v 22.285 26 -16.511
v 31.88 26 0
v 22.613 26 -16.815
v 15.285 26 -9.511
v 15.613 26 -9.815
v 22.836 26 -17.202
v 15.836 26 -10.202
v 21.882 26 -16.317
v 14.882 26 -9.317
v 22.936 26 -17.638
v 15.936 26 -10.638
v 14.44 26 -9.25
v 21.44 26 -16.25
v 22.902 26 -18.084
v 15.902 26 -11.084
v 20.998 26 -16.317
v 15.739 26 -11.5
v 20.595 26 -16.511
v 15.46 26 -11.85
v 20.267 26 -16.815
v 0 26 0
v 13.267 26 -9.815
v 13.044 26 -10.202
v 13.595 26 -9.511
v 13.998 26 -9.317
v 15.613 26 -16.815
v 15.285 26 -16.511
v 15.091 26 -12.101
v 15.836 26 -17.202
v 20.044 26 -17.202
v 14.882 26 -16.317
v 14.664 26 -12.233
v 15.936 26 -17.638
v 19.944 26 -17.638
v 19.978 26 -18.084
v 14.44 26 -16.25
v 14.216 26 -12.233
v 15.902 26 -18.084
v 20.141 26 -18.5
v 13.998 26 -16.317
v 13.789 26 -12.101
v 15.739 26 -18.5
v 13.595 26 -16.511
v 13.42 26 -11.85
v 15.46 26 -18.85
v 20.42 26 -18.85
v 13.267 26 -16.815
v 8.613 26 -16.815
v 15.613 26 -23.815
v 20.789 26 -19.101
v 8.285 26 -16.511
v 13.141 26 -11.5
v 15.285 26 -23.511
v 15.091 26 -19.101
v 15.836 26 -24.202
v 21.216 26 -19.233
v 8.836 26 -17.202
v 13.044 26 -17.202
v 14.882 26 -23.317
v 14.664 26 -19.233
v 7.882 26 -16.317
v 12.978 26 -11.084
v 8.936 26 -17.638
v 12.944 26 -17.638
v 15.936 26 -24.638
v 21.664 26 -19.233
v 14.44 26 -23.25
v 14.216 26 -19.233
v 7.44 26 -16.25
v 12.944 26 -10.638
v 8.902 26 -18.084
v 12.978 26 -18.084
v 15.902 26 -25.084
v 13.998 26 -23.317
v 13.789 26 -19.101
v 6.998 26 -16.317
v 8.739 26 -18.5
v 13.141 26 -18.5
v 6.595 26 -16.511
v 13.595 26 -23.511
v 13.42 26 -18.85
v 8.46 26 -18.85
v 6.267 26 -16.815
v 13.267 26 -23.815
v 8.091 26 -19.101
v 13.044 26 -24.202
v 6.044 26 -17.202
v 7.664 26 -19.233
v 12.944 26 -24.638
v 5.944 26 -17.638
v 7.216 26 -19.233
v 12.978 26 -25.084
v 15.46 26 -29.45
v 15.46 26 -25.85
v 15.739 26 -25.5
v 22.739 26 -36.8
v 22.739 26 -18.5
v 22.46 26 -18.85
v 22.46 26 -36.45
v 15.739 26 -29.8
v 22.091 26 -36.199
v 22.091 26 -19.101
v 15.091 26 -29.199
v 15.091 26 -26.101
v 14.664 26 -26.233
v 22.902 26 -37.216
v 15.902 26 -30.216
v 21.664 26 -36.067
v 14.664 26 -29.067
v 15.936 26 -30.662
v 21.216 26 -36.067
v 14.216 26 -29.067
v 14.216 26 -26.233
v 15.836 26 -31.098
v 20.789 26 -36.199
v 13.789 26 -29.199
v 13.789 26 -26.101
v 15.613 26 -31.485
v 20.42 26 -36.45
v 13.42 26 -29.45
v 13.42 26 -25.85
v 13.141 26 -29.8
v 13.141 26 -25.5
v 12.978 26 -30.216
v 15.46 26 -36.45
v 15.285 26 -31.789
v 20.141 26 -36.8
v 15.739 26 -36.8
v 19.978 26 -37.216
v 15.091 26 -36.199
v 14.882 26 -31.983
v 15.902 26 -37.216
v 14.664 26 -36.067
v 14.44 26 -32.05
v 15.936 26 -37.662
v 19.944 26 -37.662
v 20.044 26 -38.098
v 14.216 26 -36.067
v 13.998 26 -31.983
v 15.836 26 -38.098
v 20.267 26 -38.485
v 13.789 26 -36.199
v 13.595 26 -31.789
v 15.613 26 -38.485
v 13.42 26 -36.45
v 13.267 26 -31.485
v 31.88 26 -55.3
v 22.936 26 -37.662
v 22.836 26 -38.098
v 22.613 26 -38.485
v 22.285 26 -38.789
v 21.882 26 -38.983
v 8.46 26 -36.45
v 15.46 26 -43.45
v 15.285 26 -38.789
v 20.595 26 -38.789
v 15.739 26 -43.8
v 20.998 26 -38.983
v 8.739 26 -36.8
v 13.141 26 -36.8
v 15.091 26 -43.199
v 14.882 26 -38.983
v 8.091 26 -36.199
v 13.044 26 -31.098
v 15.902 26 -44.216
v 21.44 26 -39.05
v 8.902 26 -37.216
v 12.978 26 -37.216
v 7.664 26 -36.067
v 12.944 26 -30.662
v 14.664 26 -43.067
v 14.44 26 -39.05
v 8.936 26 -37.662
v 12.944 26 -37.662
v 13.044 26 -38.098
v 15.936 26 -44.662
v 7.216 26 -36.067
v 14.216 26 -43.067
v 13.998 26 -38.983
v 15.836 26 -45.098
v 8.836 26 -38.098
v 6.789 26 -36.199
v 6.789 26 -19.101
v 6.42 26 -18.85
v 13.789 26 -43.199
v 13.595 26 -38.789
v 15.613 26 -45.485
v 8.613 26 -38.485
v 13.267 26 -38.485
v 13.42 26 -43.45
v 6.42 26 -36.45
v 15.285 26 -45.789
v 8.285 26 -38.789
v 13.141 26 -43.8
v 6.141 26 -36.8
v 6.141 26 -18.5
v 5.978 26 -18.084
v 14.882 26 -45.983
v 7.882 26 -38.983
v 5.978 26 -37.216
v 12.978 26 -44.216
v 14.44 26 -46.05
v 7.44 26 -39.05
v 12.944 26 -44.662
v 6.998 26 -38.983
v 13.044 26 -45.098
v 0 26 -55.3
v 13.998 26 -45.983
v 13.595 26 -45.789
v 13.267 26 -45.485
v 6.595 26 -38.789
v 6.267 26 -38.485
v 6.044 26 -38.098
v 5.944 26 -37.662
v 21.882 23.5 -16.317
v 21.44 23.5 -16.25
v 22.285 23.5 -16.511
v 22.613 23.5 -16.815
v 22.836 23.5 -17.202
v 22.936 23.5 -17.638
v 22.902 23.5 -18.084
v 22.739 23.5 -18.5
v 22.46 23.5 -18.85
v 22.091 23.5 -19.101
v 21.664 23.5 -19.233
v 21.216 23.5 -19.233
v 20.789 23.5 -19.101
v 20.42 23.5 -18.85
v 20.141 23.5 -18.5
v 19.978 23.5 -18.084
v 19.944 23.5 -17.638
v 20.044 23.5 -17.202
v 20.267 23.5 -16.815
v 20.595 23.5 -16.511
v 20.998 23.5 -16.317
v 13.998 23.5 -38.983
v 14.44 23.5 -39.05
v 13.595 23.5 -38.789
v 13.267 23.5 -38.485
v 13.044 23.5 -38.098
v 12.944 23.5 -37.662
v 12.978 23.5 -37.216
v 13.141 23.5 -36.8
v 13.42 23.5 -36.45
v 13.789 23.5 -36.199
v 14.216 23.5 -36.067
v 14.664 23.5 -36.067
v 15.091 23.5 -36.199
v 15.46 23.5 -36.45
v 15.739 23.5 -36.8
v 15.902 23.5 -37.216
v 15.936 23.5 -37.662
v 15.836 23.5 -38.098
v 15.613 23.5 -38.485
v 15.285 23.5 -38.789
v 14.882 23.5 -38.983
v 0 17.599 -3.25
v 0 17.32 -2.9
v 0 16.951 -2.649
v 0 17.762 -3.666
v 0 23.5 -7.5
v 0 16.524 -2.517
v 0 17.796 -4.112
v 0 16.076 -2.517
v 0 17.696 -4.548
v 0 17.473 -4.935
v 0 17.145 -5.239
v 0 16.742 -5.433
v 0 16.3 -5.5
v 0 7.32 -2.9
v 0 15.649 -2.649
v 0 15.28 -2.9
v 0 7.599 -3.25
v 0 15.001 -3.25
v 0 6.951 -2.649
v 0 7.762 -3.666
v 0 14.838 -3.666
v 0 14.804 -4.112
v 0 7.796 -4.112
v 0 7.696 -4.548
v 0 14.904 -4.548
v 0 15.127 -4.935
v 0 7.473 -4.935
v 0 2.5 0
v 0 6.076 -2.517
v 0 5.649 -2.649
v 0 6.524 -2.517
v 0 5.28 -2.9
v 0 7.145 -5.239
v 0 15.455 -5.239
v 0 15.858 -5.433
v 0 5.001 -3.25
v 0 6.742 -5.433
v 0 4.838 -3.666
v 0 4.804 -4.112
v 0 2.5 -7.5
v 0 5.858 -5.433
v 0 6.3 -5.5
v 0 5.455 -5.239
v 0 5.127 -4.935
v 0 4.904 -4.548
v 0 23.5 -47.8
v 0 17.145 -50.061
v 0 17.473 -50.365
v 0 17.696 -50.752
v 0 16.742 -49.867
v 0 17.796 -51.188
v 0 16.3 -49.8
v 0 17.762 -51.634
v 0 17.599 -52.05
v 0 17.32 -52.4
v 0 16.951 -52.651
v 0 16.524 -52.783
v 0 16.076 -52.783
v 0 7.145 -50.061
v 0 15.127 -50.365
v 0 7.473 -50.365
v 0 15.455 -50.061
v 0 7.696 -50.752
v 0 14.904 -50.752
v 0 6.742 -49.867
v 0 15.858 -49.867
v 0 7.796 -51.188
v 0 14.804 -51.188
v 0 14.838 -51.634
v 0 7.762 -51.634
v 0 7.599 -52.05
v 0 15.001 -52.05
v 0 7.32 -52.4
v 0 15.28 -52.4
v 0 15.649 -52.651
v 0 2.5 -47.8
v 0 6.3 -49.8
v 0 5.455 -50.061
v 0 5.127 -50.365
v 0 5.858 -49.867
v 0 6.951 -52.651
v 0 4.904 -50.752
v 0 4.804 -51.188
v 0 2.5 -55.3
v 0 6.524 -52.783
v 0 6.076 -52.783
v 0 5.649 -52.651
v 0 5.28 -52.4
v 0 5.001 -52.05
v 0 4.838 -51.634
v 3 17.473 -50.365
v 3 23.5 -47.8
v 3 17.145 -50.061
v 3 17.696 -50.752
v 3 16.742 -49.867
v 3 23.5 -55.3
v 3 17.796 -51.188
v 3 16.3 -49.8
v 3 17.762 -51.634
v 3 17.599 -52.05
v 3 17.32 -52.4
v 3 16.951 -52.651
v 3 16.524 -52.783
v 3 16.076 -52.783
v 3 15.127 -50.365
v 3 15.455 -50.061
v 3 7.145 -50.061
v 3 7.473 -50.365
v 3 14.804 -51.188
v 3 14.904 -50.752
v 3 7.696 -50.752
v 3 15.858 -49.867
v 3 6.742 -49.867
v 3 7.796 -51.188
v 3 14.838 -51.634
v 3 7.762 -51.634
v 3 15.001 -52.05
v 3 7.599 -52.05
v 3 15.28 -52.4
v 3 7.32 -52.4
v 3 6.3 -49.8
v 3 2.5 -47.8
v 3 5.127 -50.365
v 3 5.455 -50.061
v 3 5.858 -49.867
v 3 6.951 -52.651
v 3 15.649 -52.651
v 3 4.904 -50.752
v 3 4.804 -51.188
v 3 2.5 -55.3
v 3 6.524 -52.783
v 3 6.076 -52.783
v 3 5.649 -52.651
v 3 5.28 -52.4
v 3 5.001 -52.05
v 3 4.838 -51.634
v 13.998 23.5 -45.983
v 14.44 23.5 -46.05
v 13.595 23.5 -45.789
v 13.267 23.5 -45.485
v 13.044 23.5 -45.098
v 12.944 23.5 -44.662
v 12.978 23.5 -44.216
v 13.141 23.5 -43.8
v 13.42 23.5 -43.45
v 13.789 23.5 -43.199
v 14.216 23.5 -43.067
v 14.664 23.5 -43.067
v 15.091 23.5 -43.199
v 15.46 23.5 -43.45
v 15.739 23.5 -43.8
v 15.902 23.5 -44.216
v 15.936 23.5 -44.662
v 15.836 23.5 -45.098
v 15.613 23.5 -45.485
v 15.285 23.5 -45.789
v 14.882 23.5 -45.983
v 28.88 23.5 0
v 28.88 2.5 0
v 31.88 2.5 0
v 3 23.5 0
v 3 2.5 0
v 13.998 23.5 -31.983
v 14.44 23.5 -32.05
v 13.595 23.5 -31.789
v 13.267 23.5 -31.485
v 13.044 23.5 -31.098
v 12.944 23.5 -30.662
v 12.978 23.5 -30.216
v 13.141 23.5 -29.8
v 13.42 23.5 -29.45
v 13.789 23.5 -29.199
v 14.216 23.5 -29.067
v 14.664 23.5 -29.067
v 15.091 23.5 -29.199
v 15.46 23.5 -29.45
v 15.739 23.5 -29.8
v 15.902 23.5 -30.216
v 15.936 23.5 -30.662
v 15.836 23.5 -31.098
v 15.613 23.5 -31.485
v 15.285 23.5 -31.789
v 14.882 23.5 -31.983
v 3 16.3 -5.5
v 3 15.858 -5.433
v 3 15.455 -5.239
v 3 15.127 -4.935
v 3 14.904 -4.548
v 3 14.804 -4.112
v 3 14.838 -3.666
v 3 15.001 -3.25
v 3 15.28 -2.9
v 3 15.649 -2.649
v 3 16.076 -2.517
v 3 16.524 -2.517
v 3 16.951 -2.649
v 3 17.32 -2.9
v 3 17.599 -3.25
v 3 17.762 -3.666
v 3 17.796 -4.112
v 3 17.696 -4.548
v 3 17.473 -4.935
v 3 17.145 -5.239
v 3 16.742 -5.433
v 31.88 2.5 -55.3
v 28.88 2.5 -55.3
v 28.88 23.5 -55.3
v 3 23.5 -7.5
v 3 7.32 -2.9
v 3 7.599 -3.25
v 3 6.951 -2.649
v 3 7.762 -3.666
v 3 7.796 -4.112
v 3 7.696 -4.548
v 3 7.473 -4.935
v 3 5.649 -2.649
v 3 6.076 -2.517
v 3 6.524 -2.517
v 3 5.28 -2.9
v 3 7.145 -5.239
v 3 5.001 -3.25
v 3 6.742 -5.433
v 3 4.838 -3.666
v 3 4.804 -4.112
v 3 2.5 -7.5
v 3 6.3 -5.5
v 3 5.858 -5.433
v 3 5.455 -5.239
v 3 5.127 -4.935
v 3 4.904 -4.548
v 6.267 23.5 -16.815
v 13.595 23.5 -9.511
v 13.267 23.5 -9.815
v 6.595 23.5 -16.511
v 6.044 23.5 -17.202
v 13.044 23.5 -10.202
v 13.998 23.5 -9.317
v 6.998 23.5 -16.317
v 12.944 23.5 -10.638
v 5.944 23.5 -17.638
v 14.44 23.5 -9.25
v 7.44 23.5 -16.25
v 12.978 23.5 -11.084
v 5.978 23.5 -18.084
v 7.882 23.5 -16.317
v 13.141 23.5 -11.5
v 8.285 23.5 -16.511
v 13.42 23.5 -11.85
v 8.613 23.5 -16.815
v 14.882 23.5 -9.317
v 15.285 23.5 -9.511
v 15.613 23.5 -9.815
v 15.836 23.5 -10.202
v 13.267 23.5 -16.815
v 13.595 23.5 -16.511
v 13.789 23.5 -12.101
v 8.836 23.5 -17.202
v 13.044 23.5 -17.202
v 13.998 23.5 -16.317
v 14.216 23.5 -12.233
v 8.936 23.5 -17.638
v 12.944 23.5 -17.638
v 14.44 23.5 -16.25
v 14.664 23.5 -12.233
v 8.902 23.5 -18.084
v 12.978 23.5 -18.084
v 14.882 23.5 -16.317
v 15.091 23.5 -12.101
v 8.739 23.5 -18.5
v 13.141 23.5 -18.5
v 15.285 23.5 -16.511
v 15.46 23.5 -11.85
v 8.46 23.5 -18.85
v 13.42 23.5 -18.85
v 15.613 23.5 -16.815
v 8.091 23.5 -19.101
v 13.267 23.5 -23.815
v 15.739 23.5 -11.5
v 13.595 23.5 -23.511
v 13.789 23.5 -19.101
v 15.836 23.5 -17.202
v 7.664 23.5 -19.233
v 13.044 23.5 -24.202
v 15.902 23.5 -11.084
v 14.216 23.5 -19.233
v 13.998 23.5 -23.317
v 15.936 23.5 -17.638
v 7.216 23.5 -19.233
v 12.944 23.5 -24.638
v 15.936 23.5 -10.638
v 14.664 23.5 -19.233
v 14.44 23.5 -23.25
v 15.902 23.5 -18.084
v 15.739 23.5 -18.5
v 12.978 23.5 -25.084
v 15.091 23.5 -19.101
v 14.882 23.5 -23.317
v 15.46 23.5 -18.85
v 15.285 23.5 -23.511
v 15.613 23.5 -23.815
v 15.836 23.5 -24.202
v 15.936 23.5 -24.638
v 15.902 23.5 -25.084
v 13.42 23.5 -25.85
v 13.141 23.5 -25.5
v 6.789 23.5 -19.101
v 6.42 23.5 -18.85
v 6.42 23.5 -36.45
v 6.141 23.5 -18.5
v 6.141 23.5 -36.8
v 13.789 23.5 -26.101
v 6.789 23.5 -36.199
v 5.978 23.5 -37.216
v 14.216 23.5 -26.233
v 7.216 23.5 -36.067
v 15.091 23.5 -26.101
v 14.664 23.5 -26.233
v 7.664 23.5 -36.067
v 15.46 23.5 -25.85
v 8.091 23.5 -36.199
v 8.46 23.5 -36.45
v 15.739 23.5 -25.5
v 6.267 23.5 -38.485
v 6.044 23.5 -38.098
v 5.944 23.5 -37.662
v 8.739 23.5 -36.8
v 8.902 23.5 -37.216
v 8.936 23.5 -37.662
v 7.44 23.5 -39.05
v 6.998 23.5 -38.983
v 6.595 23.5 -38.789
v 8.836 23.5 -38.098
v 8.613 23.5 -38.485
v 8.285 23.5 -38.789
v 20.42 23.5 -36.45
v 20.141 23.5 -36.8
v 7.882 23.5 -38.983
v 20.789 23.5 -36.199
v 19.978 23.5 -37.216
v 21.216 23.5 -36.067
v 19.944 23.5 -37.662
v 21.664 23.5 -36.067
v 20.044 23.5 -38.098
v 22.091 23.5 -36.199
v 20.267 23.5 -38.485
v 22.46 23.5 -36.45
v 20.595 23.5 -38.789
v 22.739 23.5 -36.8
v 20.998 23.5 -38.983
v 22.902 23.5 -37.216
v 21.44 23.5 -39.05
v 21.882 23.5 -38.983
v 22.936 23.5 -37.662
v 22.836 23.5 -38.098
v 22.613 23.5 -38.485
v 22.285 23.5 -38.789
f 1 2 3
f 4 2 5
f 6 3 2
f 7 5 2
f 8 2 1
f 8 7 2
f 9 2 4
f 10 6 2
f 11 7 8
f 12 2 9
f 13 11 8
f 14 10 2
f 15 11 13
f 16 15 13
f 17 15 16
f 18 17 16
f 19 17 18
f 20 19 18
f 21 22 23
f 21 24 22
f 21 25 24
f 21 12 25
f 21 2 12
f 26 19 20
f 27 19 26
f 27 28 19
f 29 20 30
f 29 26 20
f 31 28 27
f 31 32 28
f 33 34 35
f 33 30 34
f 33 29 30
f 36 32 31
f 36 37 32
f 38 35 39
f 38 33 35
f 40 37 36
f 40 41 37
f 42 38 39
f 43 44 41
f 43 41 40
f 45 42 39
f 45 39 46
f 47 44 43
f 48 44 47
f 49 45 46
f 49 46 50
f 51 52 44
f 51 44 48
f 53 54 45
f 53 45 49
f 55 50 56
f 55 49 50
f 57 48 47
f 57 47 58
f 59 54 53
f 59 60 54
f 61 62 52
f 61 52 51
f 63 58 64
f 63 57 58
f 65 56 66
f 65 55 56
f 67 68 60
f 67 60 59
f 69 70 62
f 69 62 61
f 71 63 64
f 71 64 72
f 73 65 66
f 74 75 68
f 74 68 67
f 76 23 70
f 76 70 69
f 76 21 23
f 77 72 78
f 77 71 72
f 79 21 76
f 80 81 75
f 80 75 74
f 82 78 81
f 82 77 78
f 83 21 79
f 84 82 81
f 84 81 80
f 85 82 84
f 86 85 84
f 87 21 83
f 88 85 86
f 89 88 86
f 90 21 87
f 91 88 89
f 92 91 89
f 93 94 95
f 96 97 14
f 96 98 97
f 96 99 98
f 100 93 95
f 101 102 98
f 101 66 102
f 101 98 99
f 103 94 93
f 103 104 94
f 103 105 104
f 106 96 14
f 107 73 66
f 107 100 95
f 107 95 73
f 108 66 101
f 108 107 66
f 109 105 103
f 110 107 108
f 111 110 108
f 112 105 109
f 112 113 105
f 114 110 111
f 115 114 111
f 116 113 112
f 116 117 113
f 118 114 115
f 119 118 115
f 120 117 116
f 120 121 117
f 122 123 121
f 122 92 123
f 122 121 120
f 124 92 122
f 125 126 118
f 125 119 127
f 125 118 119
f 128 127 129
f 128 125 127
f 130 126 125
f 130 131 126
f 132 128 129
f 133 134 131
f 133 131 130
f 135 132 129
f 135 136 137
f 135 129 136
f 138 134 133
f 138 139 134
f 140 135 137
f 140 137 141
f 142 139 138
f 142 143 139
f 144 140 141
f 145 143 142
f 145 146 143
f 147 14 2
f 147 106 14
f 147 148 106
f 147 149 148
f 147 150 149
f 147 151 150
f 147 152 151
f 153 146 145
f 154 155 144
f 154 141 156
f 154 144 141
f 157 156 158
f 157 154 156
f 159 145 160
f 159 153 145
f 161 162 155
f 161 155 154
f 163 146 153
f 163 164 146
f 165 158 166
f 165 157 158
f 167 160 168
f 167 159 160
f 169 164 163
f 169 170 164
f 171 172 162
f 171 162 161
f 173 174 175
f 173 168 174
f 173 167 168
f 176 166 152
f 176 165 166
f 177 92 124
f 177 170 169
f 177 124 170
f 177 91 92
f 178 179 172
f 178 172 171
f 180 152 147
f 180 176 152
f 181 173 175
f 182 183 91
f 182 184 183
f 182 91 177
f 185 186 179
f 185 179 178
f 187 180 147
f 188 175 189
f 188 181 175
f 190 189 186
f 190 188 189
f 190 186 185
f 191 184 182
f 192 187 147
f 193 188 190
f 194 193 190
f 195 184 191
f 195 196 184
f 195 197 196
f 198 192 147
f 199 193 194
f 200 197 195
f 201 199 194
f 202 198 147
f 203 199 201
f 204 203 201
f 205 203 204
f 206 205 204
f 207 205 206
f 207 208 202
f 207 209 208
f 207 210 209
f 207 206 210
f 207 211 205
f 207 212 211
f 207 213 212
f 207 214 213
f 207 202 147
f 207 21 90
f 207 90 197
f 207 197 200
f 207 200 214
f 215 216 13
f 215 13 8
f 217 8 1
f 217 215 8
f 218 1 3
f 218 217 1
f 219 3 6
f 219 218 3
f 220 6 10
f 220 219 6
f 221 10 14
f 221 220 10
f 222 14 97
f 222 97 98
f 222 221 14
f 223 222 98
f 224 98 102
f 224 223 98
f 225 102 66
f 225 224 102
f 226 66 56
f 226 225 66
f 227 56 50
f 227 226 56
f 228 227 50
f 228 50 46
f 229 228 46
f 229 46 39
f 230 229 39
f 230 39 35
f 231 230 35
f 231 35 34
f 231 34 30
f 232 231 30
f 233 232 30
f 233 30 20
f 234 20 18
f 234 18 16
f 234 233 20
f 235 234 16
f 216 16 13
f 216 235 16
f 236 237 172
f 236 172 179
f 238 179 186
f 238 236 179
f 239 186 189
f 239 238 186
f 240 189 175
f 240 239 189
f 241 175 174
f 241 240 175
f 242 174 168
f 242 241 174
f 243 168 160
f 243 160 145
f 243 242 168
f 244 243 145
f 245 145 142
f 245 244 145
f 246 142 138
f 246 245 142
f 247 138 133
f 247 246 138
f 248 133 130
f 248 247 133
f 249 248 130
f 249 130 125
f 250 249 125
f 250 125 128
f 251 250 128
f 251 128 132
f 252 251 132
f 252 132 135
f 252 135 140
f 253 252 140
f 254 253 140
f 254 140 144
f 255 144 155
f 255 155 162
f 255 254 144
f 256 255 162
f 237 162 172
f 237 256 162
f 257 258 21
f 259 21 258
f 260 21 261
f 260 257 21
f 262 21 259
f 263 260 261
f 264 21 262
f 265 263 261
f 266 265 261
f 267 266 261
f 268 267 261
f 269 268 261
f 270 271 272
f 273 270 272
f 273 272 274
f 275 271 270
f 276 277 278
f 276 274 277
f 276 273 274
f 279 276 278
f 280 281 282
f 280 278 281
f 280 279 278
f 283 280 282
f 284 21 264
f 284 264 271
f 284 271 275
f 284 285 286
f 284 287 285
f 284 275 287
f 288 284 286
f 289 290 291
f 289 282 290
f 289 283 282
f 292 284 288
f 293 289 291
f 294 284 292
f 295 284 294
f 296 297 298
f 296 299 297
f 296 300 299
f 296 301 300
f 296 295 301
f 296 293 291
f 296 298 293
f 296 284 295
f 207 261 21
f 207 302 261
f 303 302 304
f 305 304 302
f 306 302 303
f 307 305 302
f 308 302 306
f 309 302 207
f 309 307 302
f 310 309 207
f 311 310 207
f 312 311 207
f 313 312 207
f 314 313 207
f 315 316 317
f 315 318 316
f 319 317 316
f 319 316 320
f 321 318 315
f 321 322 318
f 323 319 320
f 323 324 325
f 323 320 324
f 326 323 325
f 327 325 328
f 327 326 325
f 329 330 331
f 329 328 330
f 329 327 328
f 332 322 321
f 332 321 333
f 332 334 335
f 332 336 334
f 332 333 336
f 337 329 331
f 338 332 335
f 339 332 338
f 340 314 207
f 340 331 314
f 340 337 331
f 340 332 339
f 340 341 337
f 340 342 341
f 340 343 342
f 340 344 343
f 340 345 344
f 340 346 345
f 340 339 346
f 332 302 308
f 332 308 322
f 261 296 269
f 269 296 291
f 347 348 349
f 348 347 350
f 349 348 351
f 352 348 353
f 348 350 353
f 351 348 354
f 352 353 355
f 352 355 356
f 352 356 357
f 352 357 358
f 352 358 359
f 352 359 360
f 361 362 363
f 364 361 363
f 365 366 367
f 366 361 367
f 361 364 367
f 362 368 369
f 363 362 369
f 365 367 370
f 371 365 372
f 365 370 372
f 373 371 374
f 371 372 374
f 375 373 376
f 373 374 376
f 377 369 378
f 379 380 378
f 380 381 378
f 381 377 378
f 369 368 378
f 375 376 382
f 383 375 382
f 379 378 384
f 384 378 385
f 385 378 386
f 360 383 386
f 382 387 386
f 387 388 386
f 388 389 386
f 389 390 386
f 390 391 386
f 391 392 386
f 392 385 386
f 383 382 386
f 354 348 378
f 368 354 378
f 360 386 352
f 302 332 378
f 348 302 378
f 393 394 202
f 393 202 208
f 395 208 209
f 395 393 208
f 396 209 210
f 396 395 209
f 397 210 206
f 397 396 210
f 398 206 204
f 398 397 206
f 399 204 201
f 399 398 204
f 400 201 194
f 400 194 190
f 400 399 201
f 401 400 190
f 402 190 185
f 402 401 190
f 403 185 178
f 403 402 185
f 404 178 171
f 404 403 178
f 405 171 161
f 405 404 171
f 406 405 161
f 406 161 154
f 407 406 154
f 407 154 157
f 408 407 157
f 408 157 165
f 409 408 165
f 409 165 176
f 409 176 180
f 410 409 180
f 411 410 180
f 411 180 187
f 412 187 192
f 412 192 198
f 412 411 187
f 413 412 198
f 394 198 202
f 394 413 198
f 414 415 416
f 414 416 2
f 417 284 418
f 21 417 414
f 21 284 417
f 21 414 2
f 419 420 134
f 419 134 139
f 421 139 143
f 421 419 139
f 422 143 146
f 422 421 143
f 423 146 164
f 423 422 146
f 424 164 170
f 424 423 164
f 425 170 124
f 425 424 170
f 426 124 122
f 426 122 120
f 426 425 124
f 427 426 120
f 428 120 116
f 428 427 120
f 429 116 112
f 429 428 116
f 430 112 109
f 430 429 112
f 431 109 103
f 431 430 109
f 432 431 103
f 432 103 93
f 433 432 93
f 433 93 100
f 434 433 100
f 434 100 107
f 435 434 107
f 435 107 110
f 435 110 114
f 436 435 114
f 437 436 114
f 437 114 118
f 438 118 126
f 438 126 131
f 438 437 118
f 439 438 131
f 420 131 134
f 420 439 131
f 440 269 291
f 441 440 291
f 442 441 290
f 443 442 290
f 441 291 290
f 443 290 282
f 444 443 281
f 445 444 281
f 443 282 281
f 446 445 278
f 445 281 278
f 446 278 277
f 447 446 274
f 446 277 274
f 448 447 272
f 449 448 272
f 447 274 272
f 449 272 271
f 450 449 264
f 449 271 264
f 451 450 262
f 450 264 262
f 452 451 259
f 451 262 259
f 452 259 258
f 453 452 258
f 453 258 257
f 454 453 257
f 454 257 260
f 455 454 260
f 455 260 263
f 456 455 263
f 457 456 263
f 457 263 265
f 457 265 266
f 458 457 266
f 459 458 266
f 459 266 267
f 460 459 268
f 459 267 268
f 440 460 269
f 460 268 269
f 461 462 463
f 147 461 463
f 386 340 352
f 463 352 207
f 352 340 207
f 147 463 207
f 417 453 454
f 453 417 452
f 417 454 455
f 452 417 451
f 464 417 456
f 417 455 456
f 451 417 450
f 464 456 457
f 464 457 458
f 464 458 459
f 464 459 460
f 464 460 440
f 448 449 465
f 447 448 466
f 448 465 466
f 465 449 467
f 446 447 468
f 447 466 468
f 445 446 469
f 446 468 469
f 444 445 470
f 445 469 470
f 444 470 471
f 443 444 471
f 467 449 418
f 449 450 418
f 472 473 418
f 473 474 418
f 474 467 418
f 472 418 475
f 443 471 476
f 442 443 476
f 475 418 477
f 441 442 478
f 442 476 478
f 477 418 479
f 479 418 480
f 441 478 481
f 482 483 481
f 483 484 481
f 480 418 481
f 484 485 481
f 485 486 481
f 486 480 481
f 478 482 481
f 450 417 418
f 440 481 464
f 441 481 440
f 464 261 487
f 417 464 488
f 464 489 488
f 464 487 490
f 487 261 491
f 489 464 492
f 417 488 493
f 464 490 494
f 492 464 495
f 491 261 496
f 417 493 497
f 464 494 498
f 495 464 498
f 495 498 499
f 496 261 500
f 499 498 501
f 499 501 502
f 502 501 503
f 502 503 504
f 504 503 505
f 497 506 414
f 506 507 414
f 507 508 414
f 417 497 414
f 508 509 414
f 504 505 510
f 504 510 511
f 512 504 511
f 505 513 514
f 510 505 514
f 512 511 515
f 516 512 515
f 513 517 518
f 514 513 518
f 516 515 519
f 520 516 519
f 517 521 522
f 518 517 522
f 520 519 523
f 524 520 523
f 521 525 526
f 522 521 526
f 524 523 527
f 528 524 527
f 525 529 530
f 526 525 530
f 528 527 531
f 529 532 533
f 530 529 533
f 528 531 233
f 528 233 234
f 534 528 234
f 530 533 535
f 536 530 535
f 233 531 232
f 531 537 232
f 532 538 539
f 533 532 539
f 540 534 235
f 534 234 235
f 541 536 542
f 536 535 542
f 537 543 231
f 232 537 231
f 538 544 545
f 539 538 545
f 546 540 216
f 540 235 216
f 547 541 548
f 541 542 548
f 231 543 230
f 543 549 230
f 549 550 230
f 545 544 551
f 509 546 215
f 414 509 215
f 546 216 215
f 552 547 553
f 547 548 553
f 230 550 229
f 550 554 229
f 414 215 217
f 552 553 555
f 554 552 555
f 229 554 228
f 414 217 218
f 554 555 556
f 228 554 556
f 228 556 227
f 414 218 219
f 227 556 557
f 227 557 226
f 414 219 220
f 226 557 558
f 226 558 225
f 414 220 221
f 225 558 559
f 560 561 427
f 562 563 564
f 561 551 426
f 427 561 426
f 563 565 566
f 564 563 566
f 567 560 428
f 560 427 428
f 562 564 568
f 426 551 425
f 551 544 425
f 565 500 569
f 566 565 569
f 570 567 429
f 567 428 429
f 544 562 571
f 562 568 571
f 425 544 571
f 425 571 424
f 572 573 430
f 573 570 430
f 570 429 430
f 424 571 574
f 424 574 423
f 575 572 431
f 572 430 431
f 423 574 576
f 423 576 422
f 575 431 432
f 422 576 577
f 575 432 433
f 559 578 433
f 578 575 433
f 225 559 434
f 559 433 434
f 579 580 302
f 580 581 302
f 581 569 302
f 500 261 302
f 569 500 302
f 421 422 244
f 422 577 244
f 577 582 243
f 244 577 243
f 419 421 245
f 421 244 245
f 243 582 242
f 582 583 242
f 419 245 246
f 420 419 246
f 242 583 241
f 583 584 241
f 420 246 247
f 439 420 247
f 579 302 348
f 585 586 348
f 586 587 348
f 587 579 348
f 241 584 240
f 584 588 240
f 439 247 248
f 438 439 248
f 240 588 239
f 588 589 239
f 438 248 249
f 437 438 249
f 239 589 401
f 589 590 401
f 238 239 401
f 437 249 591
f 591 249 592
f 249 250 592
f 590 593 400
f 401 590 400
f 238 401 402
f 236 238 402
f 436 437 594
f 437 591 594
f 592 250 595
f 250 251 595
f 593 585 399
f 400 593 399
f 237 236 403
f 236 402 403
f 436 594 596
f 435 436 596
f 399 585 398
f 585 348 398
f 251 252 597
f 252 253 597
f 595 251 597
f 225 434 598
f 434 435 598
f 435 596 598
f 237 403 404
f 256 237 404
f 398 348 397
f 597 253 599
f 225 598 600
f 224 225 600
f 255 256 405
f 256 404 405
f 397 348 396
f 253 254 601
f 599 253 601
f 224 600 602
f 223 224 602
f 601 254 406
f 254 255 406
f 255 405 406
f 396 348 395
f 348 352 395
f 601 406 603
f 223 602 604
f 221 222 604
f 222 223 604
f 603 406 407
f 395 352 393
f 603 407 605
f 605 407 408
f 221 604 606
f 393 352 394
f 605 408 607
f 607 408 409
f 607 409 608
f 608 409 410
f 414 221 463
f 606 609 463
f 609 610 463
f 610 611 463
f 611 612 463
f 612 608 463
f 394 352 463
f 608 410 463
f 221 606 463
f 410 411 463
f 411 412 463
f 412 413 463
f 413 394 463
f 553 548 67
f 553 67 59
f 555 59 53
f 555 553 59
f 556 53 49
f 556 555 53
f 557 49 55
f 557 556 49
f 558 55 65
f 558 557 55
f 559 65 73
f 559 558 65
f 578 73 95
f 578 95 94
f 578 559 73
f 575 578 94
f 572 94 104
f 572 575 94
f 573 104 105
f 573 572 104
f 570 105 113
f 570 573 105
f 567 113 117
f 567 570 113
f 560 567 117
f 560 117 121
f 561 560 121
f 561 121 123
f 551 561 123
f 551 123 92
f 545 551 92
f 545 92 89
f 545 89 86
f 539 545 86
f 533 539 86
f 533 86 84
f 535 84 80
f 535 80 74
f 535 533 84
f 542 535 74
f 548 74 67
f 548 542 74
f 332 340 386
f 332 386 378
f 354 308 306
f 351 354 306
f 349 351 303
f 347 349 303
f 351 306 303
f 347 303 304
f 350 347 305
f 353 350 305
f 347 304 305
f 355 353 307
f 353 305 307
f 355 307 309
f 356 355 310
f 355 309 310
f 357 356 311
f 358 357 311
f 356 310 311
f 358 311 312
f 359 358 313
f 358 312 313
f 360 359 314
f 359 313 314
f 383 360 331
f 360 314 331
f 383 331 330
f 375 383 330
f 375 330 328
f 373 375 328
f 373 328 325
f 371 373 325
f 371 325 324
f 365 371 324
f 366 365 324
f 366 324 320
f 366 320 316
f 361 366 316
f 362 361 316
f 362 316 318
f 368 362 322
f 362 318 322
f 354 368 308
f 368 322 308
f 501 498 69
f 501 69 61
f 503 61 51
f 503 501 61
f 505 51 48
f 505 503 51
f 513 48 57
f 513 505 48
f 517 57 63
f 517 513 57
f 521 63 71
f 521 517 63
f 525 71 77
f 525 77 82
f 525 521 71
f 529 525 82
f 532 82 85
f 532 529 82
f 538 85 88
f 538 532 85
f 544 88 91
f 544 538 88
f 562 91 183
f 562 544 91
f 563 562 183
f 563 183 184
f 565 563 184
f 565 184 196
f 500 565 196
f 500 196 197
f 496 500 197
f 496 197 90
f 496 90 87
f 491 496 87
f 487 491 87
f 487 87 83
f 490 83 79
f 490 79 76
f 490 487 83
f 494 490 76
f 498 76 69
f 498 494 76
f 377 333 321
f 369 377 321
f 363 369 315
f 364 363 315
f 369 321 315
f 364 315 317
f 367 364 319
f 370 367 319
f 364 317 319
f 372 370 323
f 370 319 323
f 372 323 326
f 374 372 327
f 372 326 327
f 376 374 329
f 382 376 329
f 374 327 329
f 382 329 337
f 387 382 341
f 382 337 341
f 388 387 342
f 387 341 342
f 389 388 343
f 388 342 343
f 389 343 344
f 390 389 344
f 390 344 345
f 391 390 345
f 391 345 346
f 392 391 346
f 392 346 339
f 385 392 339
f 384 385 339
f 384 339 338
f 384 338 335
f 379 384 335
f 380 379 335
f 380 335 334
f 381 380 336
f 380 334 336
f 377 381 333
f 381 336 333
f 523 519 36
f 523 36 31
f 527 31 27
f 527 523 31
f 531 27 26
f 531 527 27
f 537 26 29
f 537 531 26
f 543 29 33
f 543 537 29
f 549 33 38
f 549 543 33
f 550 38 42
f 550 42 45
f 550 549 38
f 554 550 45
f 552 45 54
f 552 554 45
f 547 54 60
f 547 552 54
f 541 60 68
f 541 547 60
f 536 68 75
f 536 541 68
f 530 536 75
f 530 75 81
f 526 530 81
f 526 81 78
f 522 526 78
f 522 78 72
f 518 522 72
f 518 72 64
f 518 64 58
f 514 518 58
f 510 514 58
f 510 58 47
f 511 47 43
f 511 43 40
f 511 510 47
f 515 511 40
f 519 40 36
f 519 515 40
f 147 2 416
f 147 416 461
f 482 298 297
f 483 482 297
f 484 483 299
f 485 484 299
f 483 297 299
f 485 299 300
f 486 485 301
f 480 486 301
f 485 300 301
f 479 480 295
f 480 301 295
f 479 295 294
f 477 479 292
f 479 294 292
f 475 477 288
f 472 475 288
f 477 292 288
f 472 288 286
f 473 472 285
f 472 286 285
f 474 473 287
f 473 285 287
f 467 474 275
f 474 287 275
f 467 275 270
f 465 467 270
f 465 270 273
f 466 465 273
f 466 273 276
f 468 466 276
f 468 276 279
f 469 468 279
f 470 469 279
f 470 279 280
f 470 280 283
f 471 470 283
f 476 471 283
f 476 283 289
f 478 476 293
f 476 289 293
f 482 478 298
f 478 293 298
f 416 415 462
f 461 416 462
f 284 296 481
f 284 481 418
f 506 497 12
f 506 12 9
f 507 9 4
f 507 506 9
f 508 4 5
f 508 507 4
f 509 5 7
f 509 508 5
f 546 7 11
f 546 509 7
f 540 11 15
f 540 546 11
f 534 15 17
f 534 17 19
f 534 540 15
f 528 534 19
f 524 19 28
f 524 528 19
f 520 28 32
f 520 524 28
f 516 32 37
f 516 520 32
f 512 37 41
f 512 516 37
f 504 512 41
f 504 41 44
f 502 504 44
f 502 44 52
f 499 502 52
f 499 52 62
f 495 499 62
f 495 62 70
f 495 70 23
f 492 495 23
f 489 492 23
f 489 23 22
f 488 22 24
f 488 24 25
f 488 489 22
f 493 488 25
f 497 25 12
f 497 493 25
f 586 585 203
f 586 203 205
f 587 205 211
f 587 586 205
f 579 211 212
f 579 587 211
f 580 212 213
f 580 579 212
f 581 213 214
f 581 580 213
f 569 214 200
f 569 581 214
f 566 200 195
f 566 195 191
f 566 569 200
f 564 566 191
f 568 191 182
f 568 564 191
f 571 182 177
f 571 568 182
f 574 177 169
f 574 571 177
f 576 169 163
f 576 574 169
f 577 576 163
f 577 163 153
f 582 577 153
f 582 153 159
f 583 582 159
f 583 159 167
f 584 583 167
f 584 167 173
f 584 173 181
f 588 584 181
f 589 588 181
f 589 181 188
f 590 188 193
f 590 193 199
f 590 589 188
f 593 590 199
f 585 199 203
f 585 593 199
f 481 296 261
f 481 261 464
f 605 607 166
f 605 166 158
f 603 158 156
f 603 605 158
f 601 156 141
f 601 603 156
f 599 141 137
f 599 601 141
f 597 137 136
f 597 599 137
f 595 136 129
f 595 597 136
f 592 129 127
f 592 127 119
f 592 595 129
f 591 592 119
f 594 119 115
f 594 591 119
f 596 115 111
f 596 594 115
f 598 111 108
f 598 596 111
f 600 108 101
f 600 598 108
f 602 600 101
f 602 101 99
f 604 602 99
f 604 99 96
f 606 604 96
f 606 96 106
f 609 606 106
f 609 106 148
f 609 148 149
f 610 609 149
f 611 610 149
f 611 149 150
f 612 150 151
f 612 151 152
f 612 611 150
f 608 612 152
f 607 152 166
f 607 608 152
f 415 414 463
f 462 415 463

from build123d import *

# Parameters (mm, degrees)
CROQUIS1_W               = 28.88
CROQUIS1_H               = 55.3
CROQUIS1_R               = 1.5
SALIENTE_EXTRUIR8_DEPTH  = 3
CROQUIS19_W              = 28.88
CROQUIS19_H              = 55.3
CORTAR_EXTRUIR3_DEPTH    = 0.5
CROQUIS20_W              = 3
CROQUIS20_H              = 7.5
SALIENTE_EXTRUIR18_DEPTH = 23.5
SALIENTE_EXTRUIR19_START = -2.5
CROQUIS21_W              = 28.88
CROQUIS21_H              = 55.3
CROQUIS21_R              = 1.5
SALIENTE_EXTRUIR19_DEPTH = 2.5
CROQUIS22_R              = 1.5
CORTAR_EXTRUIR4_DEPTH    = 3
CROQUIS23_W              = 55.3
CROQUIS23_H              = 2.5
CORTAR_EXTRUIR5_DEPTH    = 68.588049239
CROQUIS24_W              = 55.3
CROQUIS24_H              = 23.5
SALIENTE_EXTRUIR20_DEPTH = 3


with BuildPart() as part:
    # Croquis1 → Saliente-Extruir8 (new body)
    with BuildSketch(Plane(origin=(0, 0, 0), x_dir=(1, 0, 0), z_dir=(0, 1, 0))):
        with Locations((14.44, 27.65)):
            Rectangle(CROQUIS1_W, CROQUIS1_H)
        with Locations(Location((14.44, 17.75, 0), (0, 0, 270))):
            Circle(CROQUIS1_R, mode=Mode.SUBTRACT)
        with Locations(Location((21.44, 17.75, 0), (0, 0, 270))):
            Circle(CROQUIS1_R, mode=Mode.SUBTRACT)
        with Locations(Location((14.44, 24.75, 0), (0, 0, 270))):
            Circle(CROQUIS1_R, mode=Mode.SUBTRACT)
        with Locations(Location((7.44, 17.75, 0), (0, 0, 270))):
            Circle(CROQUIS1_R, mode=Mode.SUBTRACT)
        with Locations(Location((14.44, 10.75, 0), (0, 0, 270))):
            Circle(CROQUIS1_R, mode=Mode.SUBTRACT)
        with Locations(Location((21.44, 37.55, 0), (0, 0, 90))):
            Circle(CROQUIS1_R, mode=Mode.SUBTRACT)
        with Locations(Location((14.44, 44.55, 0), (0, 0, 90))):
            Circle(CROQUIS1_R, mode=Mode.SUBTRACT)
        with Locations(Location((14.44, 30.55, 0), (0, 0, 90))):
            Circle(CROQUIS1_R, mode=Mode.SUBTRACT)
        with Locations(Location((14.44, 37.55, 0), (0, 0, 90))):
            Circle(CROQUIS1_R, mode=Mode.SUBTRACT)
        with Locations(Location((7.44, 37.55, 0), (0, 0, 90))):
            Circle(CROQUIS1_R, mode=Mode.SUBTRACT)
    extrude(amount=SALIENTE_EXTRUIR8_DEPTH)

    # Croquis19 → Cortar-Extruir3 (cut)
    with BuildSketch(Plane(origin=(0, 3, 0), x_dir=(1, 0, 0), z_dir=(0, 1, 0))):
        with Locations((14.44, 27.65)):
            Rectangle(CROQUIS19_W, CROQUIS19_H)
    extrude(amount=-CORTAR_EXTRUIR3_DEPTH, mode=Mode.SUBTRACT)

    # Croquis20 → Saliente-Extruir18 (add)
    with BuildSketch(Plane(origin=(0, 2.5, 0), x_dir=(1, 0, 0), z_dir=(0, 1, 0))):
        with Locations((1.5, 51.55)):
            Rectangle(CROQUIS20_W, CROQUIS20_H)
        with Locations((1.5, 3.75)):
            Rectangle(CROQUIS20_W, CROQUIS20_H)
    extrude(amount=SALIENTE_EXTRUIR18_DEPTH)

    # Croquis21 → Saliente-Extruir19 (add)
    with BuildSketch(Plane(origin=(0, 26, 0), x_dir=(1, 0, 0), z_dir=(0, 1, 0)).offset(SALIENTE_EXTRUIR19_START)):
        with Locations((14.44, 27.65)):
            Rectangle(CROQUIS21_W, CROQUIS21_H)
        with Locations(Location((14.44, 44.55, 0), (0, 0, 90))):
            Circle(CROQUIS21_R, mode=Mode.SUBTRACT)
        with Locations(Location((21.44, 37.55, 0), (0, 0, 90))):
            Circle(CROQUIS21_R, mode=Mode.SUBTRACT)
        with Locations(Location((14.44, 37.55, 0), (0, 0, 90))):
            Circle(CROQUIS21_R, mode=Mode.SUBTRACT)
        with Locations(Location((14.44, 30.55, 0), (0, 0, 90))):
            Circle(CROQUIS21_R, mode=Mode.SUBTRACT)
        with Locations(Location((7.44, 37.55, 0), (0, 0, 90))):
            Circle(CROQUIS21_R, mode=Mode.SUBTRACT)
        with Locations(Location((14.44, 24.75, 0), (0, 0, 270))):
            Circle(CROQUIS21_R, mode=Mode.SUBTRACT)
        with Locations(Location((21.44, 17.75, 0), (0, 0, 270))):
            Circle(CROQUIS21_R, mode=Mode.SUBTRACT)
        with Locations(Location((14.44, 17.75, 0), (0, 0, 270))):
            Circle(CROQUIS21_R, mode=Mode.SUBTRACT)
        with Locations(Location((7.44, 17.75, 0), (0, 0, 270))):
            Circle(CROQUIS21_R, mode=Mode.SUBTRACT)
        with Locations(Location((14.44, 10.75, 0), (0, 0, 270))):
            Circle(CROQUIS21_R, mode=Mode.SUBTRACT)
    extrude(amount=SALIENTE_EXTRUIR19_DEPTH)

    # Croquis22 → Cortar-Extruir4 (cut)
    with BuildSketch(Plane.ZY):
        with Locations((-51.3, 6.3)):
            Circle(CROQUIS22_R)
        with Locations((-51.3, 16.3)):
            Circle(CROQUIS22_R)
        with Locations(Location((-4, 16.3, 0), (0, 0, 180))):
            Circle(CROQUIS22_R)
        with Locations(Location((-4, 6.3, 0), (0, 0, 180))):
            Circle(CROQUIS22_R)
    extrude(amount=-CORTAR_EXTRUIR4_DEPTH, mode=Mode.SUBTRACT)

    # Croquis23 → Cortar-Extruir5 (cut, through all)
    with BuildSketch(Plane.ZY):
        with Locations((-27.65, 1.25)):
            Rectangle(CROQUIS23_W, CROQUIS23_H)
    extrude(amount=-CORTAR_EXTRUIR5_DEPTH, mode=Mode.SUBTRACT)

    # Croquis24 → Saliente-Extruir20 (add)
    with BuildSketch(Plane(origin=(28.88, 0, 0), x_dir=(0, 0, -1), z_dir=(1, 0, 0))):
        with Locations((27.65, 14.25)):
            Rectangle(CROQUIS24_W, CROQUIS24_H)
    extrude(amount=SALIENTE_EXTRUIR20_DEPTH)


solid = part.part
